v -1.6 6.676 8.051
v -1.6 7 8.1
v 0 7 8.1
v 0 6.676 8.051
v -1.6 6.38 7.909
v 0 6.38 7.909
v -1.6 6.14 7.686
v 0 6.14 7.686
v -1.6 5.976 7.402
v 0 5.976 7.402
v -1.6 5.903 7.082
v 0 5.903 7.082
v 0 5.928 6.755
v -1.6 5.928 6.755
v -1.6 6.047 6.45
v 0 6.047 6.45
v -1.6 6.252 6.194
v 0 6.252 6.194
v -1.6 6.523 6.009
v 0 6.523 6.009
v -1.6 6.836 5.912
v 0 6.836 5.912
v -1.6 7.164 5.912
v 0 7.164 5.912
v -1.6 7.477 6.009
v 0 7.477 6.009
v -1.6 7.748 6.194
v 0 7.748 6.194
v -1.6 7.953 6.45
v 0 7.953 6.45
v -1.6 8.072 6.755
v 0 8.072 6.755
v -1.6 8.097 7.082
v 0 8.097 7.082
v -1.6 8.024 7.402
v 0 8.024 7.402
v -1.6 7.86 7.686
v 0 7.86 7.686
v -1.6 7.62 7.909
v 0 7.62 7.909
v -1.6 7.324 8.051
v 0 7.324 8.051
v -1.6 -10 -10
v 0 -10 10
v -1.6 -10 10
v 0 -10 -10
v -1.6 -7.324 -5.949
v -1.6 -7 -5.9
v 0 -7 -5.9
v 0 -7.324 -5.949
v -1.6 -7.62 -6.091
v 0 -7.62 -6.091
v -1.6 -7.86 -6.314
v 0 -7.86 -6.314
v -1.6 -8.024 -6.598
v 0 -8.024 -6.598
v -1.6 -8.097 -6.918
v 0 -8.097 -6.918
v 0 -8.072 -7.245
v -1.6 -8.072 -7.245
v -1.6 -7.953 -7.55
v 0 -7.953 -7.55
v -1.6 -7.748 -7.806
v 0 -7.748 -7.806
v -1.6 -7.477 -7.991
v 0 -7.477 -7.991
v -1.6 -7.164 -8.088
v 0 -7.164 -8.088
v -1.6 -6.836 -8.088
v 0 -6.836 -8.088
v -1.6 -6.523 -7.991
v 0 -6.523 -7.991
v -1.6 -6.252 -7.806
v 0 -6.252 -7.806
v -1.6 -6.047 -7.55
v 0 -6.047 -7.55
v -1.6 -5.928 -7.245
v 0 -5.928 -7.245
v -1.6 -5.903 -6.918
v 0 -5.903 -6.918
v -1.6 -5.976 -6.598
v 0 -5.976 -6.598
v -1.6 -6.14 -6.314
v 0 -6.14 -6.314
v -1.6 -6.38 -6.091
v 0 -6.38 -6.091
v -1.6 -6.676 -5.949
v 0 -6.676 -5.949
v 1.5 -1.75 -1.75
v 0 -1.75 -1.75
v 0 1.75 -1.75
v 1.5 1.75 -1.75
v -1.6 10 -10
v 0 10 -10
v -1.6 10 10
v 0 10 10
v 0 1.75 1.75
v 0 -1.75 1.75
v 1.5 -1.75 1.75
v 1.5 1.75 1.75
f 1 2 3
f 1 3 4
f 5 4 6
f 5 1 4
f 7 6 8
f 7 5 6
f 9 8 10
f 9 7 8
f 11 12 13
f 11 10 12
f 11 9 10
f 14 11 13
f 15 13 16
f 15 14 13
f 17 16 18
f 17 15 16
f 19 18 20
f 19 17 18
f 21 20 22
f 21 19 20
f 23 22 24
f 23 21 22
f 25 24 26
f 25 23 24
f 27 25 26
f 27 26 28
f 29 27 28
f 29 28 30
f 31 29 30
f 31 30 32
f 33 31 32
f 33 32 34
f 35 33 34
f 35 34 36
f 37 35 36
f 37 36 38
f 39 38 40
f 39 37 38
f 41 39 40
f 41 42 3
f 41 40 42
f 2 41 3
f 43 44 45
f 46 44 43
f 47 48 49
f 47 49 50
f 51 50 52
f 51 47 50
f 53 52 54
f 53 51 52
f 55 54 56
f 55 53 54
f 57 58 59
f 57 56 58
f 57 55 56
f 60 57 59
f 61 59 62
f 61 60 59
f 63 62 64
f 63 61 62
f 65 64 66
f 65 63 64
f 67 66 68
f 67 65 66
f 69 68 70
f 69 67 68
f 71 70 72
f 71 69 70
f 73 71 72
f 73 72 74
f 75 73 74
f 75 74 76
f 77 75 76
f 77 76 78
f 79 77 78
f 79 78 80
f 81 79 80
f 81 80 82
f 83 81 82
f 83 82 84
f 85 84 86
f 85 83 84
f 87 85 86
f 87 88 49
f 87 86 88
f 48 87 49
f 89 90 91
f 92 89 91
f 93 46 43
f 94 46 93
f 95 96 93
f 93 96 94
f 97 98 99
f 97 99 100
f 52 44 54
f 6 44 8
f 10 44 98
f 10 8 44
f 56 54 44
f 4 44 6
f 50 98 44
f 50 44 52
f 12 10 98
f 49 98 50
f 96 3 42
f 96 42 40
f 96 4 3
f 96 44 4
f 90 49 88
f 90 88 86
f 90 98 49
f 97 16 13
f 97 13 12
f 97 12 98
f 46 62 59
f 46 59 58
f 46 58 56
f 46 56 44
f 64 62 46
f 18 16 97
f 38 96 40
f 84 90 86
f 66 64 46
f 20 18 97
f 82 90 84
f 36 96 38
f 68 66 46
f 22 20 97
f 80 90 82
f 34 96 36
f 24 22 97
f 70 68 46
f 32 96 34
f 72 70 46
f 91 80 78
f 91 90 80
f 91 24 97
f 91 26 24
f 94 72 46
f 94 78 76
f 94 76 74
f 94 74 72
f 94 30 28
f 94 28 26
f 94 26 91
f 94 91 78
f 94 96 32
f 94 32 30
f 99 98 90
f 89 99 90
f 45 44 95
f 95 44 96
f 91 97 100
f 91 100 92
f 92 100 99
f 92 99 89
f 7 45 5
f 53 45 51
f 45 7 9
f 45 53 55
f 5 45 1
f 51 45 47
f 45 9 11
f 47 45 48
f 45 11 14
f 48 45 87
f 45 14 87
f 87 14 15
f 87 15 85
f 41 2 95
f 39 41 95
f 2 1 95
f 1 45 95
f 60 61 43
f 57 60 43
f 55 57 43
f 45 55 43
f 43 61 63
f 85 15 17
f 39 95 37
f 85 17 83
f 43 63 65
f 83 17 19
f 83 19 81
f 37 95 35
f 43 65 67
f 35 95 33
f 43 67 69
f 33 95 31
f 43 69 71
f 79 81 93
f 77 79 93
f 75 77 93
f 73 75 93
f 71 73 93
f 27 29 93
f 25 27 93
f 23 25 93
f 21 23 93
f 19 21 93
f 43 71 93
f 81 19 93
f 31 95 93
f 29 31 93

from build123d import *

# Parameters (mm, degrees)
SKETCH1_W           = 20
SKETCH1_H           = 20
BOARD_DEPTH         = 1.6
SKETCH2_W           = 3.5
SKETCH2_H           = 3.5
UV_LED_3535_DEPTH   = 1.5
HOLES_M2_DEPTH      = 15.2323575
HOLES_M2_DEPTH_BACK = 15.2323575
SKETCH3_R           = 1.1


with BuildPart() as part:
    # Sketch1 → Board (new body)
    with BuildSketch(Plane(origin=(0, 0, 0), x_dir=(0, 0, -1), z_dir=(1, 0, 0))):
        Rectangle(SKETCH1_W, SKETCH1_H)
    extrude(amount=-BOARD_DEPTH)

    # Sketch2 → UV_LED_3535 (add)
    with BuildSketch(Plane(origin=(0, 0, 0), x_dir=(0, 0, -1), z_dir=(1, 0, 0))):
        Rectangle(SKETCH2_W, SKETCH2_H)
    extrude(amount=UV_LED_3535_DEPTH)

    # Sketch3 → Holes_M2 (cut, two sides: drawn at the far end of the back side and taken through both)
    with BuildSketch(Plane(origin=(0, 0, 0), x_dir=(0, 0, -1), z_dir=(1, 0, 0)).offset(-HOLES_M2_DEPTH_BACK)):
        with Locations(Location((7, -7, 0), (0, 0, 180))):
            Circle(SKETCH3_R)
        with Locations(Location((-7, 7, 0), (0, 0, 180))):
            Circle(SKETCH3_R)
    extrude(amount=HOLES_M2_DEPTH + HOLES_M2_DEPTH_BACK, mode=Mode.SUBTRACT)


solid = part.part
